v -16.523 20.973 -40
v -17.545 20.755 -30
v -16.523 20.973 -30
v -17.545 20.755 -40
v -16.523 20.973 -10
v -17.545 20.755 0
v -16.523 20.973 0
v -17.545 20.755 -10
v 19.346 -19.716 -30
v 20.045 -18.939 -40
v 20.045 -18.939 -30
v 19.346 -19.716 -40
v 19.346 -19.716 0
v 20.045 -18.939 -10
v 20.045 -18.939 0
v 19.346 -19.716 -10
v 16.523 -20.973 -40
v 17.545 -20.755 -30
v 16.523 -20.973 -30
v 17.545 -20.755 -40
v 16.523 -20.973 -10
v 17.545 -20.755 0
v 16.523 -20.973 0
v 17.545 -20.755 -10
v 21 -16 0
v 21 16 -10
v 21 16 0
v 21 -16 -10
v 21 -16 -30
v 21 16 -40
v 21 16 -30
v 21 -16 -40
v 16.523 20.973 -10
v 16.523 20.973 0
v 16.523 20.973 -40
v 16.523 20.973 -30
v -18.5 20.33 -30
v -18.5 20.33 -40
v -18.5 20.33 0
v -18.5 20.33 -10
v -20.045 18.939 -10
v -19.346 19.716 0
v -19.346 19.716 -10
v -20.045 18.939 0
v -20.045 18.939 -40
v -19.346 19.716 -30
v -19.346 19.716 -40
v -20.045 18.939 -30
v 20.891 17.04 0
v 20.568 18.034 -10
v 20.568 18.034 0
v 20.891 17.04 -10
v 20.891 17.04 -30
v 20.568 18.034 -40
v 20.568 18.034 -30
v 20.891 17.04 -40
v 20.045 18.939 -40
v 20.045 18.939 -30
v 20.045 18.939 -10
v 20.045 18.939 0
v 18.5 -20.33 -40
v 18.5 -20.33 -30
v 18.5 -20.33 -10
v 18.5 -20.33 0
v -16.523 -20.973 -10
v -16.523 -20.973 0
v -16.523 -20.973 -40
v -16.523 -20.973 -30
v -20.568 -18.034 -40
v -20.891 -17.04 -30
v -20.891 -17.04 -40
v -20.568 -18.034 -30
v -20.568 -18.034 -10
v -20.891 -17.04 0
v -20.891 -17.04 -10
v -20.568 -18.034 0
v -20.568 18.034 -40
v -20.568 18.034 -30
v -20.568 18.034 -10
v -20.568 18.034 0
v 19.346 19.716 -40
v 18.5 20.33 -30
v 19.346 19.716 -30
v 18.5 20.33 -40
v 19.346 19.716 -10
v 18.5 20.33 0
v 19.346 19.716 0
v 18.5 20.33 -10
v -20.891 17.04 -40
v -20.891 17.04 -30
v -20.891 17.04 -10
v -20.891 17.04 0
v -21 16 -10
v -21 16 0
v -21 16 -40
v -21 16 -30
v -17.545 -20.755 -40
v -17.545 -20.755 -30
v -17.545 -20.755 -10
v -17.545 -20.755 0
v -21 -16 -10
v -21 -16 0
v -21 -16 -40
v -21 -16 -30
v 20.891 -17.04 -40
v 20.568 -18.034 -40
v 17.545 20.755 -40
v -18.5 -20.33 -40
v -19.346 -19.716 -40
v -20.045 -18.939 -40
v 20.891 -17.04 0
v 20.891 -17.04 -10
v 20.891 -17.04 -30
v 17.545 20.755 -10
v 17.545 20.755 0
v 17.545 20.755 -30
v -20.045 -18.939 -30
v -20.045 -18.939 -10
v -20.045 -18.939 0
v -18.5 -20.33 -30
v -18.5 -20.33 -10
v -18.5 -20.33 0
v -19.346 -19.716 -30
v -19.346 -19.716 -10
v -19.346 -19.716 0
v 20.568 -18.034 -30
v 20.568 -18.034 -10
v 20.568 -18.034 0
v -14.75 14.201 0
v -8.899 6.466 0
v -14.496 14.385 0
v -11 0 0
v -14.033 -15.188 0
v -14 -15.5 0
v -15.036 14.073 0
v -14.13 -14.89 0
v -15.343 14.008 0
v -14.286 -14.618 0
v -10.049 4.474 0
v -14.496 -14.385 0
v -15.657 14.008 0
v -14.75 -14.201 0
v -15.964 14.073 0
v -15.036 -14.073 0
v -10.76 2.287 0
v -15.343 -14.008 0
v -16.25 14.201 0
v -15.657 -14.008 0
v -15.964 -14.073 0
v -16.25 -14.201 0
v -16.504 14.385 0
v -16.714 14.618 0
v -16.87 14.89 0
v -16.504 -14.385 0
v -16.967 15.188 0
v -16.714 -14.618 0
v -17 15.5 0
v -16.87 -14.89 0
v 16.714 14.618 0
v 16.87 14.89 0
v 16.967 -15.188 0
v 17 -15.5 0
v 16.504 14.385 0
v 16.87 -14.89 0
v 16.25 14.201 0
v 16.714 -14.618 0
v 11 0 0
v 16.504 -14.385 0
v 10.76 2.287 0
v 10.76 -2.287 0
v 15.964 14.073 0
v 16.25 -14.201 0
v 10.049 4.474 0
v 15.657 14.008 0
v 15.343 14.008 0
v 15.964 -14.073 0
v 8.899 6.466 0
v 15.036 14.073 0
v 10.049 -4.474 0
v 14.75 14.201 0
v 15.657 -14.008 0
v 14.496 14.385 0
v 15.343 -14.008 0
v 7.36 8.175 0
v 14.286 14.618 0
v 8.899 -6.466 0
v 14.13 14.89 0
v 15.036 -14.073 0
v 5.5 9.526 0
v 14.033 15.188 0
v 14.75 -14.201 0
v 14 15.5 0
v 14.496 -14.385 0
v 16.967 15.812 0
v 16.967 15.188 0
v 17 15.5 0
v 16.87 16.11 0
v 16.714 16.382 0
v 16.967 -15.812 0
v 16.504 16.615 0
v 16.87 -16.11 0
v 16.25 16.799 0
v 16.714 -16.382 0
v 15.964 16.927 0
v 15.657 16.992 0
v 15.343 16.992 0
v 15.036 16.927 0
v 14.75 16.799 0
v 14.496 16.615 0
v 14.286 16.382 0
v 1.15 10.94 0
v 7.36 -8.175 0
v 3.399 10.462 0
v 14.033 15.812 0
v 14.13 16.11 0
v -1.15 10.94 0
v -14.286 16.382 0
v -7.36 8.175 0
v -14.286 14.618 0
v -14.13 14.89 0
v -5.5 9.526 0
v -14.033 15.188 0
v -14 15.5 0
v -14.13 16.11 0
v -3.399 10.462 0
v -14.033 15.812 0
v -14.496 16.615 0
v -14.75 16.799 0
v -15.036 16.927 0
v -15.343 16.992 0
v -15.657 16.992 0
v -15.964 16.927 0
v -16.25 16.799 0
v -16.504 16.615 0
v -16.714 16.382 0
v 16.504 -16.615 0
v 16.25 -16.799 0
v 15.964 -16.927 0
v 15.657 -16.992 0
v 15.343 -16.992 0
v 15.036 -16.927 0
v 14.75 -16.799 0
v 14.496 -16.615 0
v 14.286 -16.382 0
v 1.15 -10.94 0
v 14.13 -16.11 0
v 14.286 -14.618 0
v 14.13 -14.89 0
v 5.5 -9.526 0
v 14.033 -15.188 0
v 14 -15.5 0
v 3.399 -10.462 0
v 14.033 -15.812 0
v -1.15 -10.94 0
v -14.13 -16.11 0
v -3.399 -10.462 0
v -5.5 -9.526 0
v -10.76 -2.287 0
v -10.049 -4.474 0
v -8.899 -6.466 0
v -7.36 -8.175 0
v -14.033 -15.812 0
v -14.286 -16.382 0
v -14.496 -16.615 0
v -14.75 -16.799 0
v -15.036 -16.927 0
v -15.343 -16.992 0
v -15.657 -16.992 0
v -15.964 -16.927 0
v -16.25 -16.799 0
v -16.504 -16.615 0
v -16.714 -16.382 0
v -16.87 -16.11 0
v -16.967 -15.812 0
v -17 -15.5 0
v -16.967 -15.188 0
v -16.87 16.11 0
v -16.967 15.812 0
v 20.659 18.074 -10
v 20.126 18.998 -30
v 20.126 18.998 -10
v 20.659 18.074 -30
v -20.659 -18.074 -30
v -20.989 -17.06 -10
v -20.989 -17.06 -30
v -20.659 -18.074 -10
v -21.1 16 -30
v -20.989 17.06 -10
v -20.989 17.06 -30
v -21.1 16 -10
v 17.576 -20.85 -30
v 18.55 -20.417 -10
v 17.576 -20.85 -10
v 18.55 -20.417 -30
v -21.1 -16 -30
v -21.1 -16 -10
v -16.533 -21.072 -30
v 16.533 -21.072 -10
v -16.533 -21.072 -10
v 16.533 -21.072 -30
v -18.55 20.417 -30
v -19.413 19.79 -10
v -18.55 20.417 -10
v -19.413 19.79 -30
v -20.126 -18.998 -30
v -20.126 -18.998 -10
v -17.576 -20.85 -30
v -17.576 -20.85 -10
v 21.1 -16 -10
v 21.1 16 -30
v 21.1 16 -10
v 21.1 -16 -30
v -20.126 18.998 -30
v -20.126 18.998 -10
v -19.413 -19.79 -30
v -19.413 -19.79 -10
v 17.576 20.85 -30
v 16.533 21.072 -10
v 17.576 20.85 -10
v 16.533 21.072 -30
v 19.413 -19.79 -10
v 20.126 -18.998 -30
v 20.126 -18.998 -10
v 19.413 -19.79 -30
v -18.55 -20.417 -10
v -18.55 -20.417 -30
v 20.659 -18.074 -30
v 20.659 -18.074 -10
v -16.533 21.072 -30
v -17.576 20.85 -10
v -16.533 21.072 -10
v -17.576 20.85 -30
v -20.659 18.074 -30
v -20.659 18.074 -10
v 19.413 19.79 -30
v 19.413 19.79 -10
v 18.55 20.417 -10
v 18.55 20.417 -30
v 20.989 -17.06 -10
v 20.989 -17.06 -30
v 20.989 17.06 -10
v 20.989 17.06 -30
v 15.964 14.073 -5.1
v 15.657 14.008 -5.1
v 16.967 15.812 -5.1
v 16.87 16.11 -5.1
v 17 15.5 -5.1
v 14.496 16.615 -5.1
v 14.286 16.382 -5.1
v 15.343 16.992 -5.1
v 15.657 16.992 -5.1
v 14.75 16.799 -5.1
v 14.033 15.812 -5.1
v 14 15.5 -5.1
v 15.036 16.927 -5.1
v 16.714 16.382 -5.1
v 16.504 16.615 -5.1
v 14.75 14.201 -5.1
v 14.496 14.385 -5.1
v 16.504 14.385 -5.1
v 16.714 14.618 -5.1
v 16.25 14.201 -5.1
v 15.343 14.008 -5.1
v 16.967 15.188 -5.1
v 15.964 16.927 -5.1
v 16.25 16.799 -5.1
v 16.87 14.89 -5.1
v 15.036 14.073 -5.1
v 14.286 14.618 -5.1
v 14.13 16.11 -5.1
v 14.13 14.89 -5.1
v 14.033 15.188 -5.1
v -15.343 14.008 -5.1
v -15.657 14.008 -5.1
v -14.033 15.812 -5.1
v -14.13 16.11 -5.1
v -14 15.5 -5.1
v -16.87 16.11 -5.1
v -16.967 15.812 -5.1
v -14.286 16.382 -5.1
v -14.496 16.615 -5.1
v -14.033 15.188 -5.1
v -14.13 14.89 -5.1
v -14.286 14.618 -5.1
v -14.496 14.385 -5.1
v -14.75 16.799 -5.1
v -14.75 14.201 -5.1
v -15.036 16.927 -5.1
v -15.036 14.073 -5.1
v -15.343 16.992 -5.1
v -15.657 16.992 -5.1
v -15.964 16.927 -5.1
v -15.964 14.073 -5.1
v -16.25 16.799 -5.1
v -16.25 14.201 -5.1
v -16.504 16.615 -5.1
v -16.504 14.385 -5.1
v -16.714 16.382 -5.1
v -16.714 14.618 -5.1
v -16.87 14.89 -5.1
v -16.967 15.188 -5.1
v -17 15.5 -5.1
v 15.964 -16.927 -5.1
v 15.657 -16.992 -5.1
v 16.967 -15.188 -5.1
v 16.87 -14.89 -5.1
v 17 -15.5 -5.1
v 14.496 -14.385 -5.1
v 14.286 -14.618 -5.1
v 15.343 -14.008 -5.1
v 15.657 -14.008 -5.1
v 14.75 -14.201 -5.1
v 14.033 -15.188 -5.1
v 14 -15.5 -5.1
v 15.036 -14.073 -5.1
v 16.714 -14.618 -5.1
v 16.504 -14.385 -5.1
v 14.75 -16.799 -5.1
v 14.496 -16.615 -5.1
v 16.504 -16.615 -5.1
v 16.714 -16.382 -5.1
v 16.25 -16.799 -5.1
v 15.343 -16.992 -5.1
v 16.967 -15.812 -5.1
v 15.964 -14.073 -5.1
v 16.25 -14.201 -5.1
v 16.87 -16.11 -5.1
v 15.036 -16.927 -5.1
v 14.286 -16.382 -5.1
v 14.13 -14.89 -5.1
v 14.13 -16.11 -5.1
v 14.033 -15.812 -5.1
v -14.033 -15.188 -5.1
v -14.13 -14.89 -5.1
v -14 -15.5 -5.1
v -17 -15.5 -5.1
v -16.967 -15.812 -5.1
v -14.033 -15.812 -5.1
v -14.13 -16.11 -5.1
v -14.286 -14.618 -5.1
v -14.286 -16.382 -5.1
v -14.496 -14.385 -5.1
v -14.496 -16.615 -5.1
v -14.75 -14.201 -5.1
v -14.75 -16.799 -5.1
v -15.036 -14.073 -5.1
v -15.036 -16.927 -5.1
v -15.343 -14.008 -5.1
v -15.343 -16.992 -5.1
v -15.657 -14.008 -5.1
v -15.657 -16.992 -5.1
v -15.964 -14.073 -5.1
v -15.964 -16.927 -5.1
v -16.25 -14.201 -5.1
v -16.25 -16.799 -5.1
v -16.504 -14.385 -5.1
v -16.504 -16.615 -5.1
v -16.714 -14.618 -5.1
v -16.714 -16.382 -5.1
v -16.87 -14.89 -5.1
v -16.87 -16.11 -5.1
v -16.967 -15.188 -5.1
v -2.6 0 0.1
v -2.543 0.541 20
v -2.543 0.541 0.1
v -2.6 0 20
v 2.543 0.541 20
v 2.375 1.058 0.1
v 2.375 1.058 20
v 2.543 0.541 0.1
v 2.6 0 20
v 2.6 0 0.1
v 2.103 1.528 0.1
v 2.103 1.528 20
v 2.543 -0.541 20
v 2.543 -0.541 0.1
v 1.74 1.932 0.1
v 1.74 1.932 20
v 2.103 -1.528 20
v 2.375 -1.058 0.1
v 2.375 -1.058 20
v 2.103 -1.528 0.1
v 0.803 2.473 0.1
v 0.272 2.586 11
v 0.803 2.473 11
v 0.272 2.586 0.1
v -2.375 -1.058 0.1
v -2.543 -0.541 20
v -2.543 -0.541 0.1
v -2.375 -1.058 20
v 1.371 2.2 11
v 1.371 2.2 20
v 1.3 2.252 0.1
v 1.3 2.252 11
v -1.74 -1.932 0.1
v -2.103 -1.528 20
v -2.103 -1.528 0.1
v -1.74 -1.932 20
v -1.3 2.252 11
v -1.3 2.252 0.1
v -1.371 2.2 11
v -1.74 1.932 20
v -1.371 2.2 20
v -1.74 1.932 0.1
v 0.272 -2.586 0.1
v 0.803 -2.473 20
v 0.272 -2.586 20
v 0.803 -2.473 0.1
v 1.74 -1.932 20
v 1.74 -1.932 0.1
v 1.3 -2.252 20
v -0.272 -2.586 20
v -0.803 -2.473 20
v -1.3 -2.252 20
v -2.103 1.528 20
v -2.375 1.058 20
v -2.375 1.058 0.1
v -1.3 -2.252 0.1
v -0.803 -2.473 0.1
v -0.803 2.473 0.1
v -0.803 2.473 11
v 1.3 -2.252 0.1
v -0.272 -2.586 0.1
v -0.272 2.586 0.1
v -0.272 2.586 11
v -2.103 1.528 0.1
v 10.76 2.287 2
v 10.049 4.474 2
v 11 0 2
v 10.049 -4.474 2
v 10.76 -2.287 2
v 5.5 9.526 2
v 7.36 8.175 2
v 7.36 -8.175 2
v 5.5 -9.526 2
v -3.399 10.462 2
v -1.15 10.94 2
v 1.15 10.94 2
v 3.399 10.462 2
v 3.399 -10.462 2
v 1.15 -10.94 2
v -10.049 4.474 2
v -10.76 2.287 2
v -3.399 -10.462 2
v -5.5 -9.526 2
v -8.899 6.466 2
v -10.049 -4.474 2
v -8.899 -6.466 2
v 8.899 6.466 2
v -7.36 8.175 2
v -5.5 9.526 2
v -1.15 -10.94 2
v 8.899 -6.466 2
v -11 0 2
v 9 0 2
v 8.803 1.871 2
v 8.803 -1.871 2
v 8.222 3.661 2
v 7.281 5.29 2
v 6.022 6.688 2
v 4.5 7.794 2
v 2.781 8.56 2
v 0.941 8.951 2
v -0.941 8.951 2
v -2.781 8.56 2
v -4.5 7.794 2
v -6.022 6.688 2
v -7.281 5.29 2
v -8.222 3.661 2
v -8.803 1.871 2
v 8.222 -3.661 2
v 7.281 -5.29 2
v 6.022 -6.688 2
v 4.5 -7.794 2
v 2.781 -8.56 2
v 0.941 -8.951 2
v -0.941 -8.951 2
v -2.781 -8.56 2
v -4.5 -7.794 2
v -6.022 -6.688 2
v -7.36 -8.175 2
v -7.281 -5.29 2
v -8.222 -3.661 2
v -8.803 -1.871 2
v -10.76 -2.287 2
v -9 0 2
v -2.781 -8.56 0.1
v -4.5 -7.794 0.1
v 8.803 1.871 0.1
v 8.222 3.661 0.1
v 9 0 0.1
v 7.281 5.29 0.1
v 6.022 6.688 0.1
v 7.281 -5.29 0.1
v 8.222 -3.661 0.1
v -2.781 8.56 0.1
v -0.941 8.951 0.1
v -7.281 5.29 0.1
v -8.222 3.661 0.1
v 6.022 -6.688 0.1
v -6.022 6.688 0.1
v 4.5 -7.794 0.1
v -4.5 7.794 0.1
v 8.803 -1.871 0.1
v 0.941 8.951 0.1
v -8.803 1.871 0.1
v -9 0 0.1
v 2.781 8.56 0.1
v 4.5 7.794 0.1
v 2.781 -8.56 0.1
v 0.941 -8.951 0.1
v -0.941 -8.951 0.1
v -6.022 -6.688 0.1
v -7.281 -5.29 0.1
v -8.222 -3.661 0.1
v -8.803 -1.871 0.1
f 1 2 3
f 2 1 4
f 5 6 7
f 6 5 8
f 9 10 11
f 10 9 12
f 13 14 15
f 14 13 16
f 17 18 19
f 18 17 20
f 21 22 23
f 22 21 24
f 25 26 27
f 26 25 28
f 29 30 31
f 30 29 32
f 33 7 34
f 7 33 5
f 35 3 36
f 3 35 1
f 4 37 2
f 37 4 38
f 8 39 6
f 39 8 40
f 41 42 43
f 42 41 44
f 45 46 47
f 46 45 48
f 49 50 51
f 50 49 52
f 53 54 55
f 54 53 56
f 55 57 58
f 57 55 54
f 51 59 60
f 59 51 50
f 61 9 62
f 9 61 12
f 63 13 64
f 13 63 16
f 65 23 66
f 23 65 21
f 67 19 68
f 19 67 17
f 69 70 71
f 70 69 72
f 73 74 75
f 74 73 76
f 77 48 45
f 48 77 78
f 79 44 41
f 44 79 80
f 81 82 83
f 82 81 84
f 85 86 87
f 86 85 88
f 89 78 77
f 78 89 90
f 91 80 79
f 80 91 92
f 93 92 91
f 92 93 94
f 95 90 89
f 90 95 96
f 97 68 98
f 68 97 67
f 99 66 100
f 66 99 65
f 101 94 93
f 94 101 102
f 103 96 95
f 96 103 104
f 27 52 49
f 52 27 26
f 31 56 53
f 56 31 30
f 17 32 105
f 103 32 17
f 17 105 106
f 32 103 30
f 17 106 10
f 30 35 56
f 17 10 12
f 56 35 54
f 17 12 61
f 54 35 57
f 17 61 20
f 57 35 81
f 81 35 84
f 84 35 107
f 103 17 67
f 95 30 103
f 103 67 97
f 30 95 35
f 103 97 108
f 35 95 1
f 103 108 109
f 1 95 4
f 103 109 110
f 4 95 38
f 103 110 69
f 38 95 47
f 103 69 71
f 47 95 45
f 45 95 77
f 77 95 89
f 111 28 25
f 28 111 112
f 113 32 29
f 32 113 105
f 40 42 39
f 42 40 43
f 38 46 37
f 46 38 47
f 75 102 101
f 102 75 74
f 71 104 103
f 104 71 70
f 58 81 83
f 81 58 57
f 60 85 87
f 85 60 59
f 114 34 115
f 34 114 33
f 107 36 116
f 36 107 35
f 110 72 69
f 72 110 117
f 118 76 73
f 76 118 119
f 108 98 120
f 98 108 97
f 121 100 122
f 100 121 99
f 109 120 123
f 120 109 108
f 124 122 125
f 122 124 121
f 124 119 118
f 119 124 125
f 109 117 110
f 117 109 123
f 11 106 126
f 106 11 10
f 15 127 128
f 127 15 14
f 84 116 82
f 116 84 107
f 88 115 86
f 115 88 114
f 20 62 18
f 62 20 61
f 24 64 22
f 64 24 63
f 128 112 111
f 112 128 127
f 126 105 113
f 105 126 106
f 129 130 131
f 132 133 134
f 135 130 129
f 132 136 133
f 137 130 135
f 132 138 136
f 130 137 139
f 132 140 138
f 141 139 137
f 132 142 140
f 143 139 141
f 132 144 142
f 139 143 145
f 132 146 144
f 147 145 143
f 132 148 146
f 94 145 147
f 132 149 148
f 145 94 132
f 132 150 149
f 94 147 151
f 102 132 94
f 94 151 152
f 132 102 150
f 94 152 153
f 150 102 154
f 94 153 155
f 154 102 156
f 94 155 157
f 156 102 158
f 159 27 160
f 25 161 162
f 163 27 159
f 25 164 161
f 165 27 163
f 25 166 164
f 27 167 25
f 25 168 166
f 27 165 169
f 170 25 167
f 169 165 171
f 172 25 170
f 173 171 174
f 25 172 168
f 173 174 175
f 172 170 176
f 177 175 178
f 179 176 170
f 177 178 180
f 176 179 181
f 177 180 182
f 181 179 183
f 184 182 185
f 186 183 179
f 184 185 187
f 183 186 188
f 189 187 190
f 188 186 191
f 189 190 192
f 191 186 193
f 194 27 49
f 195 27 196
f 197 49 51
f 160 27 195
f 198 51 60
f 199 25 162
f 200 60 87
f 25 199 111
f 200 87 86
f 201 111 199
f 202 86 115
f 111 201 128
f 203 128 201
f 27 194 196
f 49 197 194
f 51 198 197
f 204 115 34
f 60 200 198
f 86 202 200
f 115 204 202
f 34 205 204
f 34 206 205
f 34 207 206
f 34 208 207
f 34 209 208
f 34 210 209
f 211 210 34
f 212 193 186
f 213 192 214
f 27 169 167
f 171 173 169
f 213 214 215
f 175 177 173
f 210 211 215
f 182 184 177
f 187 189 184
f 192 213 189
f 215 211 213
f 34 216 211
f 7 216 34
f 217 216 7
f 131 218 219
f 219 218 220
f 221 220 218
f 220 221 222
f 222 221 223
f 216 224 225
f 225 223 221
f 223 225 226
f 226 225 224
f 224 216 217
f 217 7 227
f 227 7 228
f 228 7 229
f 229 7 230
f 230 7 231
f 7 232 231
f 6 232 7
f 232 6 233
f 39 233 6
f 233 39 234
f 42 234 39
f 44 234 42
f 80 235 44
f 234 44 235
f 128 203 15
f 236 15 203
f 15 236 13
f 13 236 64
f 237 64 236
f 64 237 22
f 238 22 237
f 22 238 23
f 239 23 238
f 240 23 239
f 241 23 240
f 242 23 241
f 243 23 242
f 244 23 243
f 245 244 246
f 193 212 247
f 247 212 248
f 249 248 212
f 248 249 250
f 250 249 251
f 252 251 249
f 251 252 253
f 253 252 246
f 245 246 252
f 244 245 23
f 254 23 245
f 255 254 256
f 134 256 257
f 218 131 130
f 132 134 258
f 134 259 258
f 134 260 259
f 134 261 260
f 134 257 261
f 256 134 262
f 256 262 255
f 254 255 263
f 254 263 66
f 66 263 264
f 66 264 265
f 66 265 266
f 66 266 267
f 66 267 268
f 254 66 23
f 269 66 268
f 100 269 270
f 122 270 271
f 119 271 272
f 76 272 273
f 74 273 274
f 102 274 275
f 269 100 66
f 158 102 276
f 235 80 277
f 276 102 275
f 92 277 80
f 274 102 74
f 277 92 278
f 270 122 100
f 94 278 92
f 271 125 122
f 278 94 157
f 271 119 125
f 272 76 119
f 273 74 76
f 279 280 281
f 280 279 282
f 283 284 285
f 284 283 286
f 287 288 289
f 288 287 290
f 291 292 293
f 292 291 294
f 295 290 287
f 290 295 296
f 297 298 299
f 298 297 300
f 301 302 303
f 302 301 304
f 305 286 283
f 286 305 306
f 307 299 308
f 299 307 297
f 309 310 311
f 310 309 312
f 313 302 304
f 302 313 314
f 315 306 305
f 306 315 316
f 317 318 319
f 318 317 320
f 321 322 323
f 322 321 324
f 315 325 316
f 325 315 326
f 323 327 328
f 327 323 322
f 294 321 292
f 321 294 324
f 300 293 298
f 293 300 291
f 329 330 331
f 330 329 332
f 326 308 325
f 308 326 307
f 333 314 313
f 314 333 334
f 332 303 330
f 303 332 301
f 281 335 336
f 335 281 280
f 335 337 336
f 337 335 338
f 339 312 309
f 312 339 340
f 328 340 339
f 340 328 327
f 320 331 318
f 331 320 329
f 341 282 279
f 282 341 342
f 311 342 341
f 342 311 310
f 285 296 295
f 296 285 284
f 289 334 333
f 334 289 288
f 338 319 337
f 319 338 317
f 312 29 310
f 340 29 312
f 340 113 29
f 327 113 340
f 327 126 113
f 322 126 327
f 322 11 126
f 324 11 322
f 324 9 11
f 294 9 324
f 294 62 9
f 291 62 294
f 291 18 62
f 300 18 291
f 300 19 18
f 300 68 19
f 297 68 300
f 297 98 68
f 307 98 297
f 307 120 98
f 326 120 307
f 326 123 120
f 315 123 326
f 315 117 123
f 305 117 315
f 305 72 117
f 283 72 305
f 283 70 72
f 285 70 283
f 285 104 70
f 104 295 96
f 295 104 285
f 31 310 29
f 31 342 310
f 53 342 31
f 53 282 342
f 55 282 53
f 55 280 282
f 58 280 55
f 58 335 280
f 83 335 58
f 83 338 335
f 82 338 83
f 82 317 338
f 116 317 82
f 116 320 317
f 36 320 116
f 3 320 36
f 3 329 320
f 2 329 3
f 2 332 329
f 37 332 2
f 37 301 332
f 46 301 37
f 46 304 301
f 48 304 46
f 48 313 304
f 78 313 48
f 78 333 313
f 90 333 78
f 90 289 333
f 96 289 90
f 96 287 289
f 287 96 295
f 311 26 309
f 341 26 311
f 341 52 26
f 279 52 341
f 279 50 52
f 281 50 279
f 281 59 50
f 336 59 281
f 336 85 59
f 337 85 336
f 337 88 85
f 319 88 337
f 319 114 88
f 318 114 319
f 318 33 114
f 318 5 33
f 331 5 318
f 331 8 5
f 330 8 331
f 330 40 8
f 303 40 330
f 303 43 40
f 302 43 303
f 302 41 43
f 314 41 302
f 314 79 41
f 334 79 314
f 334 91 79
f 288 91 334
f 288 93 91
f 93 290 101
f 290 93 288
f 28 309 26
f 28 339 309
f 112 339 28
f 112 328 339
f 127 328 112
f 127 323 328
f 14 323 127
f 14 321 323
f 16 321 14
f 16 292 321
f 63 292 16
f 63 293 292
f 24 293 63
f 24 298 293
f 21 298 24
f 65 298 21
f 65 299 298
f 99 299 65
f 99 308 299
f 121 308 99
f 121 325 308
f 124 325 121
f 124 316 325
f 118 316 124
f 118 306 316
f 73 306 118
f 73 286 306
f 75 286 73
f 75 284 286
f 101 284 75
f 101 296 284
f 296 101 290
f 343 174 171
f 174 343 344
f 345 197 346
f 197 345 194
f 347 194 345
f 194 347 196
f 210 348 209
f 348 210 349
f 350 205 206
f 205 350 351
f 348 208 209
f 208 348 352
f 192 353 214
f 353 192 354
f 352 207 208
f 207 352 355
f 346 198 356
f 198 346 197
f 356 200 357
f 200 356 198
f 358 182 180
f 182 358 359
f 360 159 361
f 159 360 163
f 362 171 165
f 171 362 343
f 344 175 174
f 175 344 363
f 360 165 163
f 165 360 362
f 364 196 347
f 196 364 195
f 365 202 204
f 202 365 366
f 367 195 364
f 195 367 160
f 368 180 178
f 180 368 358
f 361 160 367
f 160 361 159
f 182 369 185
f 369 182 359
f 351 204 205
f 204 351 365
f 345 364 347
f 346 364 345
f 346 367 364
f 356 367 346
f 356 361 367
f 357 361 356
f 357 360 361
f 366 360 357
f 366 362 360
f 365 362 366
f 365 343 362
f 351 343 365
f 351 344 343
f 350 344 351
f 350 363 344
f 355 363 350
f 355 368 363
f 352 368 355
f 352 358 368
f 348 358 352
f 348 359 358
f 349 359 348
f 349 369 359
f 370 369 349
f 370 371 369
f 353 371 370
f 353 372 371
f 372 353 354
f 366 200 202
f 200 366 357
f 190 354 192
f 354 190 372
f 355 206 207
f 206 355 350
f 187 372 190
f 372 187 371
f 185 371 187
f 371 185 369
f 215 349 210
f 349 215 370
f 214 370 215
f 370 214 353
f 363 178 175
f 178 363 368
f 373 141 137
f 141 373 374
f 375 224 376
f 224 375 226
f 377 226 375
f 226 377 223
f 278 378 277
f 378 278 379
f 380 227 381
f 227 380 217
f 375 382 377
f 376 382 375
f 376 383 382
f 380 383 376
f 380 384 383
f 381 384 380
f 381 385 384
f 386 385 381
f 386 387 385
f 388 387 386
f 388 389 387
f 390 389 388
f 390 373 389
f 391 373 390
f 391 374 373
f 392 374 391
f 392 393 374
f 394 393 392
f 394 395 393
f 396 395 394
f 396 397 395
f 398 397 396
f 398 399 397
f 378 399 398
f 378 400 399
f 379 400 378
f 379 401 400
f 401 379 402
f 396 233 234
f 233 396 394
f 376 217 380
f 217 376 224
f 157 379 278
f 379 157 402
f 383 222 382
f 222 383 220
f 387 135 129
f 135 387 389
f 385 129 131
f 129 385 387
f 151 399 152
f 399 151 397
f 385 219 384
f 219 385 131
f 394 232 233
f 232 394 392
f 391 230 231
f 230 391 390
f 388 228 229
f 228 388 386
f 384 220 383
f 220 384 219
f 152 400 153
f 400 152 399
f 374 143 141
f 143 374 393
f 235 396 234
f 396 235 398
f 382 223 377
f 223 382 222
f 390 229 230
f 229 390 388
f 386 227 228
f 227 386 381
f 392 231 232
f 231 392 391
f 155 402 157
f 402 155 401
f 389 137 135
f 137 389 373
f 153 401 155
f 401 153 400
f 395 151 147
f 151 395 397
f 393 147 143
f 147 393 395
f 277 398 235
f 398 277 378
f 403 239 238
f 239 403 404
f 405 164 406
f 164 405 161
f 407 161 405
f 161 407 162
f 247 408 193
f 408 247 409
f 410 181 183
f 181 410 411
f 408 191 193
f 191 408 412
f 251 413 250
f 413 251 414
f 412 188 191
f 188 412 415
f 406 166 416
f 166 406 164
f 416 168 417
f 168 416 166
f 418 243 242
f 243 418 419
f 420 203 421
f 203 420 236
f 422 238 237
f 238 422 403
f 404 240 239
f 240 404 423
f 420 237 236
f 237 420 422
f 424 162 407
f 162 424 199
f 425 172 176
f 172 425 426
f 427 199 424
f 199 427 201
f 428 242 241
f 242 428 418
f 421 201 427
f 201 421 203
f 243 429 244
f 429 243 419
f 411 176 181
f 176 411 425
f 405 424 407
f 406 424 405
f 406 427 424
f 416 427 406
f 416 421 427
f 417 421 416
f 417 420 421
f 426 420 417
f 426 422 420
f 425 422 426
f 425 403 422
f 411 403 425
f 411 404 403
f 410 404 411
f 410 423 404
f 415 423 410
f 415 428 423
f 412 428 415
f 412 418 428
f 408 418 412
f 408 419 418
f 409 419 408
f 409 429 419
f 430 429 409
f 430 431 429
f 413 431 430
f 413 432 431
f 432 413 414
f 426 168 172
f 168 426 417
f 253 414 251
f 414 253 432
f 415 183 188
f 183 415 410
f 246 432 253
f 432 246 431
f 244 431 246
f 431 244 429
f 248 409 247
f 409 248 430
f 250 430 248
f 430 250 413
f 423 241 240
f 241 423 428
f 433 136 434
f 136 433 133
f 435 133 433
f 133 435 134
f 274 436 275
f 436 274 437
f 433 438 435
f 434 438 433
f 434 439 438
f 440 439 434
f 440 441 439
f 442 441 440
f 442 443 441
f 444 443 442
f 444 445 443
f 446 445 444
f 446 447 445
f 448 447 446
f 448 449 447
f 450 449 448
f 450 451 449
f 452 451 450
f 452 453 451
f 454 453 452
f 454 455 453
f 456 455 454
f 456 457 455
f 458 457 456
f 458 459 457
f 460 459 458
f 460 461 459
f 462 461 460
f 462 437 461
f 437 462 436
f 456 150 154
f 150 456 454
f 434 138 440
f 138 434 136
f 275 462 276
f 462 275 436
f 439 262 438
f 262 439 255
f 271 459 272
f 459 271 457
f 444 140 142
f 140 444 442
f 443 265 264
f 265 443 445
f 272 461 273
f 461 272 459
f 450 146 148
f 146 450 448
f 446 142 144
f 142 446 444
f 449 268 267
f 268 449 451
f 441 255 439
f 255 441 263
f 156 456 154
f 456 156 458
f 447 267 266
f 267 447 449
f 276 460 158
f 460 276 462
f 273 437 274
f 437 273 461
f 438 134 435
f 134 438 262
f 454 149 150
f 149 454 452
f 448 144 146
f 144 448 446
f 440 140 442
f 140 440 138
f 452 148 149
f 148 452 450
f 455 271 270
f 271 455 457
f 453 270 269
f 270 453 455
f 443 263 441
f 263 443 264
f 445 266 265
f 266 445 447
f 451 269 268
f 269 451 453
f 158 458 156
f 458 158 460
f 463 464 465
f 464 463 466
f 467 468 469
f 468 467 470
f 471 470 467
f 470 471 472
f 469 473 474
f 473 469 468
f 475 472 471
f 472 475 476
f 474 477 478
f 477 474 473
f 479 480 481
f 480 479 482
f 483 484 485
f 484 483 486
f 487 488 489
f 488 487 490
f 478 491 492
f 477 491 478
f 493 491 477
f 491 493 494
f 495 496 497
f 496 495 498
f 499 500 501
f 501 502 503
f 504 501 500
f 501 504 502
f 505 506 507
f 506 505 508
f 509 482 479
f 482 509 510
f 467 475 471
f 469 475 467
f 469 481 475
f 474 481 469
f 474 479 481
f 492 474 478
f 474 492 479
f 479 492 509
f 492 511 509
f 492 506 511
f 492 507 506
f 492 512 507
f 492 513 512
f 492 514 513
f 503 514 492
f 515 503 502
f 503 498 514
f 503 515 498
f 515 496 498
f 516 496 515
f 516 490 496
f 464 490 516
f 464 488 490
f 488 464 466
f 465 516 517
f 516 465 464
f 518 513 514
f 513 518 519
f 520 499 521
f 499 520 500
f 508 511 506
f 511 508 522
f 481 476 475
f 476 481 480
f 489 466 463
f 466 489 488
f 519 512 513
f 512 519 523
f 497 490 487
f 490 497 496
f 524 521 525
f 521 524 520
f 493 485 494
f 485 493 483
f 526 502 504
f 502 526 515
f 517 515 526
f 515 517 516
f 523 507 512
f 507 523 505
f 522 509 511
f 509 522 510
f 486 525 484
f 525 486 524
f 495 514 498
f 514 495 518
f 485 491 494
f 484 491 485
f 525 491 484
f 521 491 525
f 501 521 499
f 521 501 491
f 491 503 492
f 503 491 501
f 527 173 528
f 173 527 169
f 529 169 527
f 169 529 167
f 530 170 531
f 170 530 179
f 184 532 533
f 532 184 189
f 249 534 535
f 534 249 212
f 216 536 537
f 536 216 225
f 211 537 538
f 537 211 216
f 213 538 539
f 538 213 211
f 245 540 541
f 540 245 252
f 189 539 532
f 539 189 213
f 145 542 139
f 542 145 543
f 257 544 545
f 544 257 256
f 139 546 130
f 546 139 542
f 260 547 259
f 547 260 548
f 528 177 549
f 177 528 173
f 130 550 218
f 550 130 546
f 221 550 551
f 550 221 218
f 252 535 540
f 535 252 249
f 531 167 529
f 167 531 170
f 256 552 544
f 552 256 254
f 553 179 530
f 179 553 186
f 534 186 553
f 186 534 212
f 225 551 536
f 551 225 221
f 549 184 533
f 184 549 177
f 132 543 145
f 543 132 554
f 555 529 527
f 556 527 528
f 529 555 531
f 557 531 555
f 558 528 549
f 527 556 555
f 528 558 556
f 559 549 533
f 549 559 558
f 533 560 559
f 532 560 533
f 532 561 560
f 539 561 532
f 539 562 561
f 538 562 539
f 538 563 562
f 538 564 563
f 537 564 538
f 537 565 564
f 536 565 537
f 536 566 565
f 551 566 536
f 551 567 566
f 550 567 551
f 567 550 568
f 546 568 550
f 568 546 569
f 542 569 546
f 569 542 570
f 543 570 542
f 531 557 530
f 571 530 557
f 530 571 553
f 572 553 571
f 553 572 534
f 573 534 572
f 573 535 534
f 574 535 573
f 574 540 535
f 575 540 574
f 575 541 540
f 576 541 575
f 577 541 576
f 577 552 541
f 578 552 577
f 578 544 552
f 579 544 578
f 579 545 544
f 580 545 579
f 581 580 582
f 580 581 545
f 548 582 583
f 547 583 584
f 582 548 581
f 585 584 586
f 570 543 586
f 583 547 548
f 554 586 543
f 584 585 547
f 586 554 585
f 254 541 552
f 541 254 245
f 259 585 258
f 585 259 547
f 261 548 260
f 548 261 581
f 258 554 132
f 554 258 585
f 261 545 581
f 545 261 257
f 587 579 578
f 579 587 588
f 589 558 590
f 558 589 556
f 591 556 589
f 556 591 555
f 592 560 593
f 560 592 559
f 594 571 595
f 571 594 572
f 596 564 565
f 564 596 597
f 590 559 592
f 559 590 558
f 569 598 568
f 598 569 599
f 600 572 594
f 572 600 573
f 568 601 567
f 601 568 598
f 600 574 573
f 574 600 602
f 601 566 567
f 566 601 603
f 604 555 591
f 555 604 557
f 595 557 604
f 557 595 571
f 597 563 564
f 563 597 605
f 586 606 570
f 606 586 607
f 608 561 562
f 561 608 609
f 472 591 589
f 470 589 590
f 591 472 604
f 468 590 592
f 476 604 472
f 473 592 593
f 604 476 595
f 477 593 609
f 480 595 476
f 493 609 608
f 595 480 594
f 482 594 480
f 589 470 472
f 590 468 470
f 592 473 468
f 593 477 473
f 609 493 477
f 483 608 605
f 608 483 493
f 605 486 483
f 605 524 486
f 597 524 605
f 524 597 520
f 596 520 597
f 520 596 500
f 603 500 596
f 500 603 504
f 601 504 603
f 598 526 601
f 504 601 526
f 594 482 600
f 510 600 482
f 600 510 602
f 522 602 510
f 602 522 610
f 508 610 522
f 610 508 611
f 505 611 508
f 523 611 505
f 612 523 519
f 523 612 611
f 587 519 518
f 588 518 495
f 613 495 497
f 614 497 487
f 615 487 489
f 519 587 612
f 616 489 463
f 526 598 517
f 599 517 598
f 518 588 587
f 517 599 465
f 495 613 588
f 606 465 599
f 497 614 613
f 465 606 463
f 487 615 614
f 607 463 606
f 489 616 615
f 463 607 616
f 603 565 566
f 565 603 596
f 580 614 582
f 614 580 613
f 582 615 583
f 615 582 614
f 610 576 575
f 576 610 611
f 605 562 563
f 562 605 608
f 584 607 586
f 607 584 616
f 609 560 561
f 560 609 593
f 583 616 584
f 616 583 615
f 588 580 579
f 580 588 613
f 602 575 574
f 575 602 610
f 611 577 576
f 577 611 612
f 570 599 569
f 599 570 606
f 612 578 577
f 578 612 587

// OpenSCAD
$fn=30;
module nema17(altezzam = 40, diametro = 5.2, asta = 0.2)
{
rotate(a=90, v=[-1,0,0])
nema(grandezzam = 42, altezzam = 40, diametro = 5.2, asta = 0.2);
}

nema17();

module nema(grandezzam=42, altezzam = 38, diametro = 5.2, asta = 0.2) {
	difference() {
    union()
    {
      color("silver")
		translate([0,altezzam/2,0]) rotate([90,0,0]) hull() {
			translate([-(grandezzam/2-5),(grandezzam/2-5),0]) cylinder(r=5,h=altezzam, center = true);
			translate([(grandezzam/2-5),(grandezzam/2-5),0]) cylinder(r=5,h=altezzam, center = true);
			translate([-(grandezzam/2-5),-(grandezzam/2-5),0]) cylinder(r=5,h=altezzam, center = true);
			translate([(grandezzam/2-5),-(grandezzam/2-5),0]) cylinder(r=5,h=altezzam, center = true);
		}
        color("black")
        translate([0,altezzam/2,0]) rotate([90,0,0]) hull() {
            translate([-(grandezzam/2-5),(grandezzam/2-5),0]) cylinder(r=5.1,h=altezzam/2, center = true);
            translate([(grandezzam/2-5),(grandezzam/2-5),0]) cylinder(r=5.1,h=altezzam/2, center = true);
            translate([-(grandezzam/2-5),-(grandezzam/2-5),0]) cylinder(r=5.1,h=altezzam/2, center = true);
            translate([(grandezzam/2-5),-(grandezzam/2-5),0]) cylinder(r=5.1,h=altezzam/2, center = true);
        }
    }


        union() {
		translate([15.5,0.1,15.5]) rotate([90,0,0]) cylinder(r=1.5,h=10, center = true);
		translate([-15.5,0.1,15.5]) rotate([90,0,0]) cylinder(r=1.5,h=10, center = true);
		translate([15.5,0.1,-15.5]) rotate([90,0,0]) cylinder(r=1.5,h=10, center = true);
		translate([-15.5,0.1,-15.5]) rotate([90,0,0]) cylinder(r=1.5,h=10, center = true);
        }
	}
    color("silver")
	translate([0,-10,0]) rotate([90,0,0])
    difference() {
        cylinder(r=diametro/2,h=20, center = true);
        translate([-diametro/2,(diametro/2)-asta*2,1])
        cube([diametro,diametro/2,10]);
    }
    color("silver")
	difference() {
		translate([0,-1,0]) rotate([90,0,0]) cylinder(r=11,h=2, center = true);
		translate([0,-1.1,0]) rotate([90,0,0]) cylinder(r=9,h=2, center = true);
	}
}

module buchi(pos=[1,1,1,1], grand=15.5, h=10, buchi=false, $fn=8){
    for (i=[0:3]) {
        if (pos[i] == 1) {
            rotate([0, 0, 90*i]) translate([grand, grand, 0]) {
                if (buchi) {
                    rotate([0, 0, -90*i]) translate([0,0,0]) rotate([0,0,90]) cylinder(h = h+0.1, r = 3/2);
					rotate([0, 0, -90*i]) translate([0,0,h]) rotate([0,0,22.5]) cylinder(h = h, r = 3*2.2/2, $fn = $fn);
                } else {
                    rotate([0, 0, -90*i]) cylinder(h=h, r=4, $fn=$fn);
                }
            }
        }
    }
}
